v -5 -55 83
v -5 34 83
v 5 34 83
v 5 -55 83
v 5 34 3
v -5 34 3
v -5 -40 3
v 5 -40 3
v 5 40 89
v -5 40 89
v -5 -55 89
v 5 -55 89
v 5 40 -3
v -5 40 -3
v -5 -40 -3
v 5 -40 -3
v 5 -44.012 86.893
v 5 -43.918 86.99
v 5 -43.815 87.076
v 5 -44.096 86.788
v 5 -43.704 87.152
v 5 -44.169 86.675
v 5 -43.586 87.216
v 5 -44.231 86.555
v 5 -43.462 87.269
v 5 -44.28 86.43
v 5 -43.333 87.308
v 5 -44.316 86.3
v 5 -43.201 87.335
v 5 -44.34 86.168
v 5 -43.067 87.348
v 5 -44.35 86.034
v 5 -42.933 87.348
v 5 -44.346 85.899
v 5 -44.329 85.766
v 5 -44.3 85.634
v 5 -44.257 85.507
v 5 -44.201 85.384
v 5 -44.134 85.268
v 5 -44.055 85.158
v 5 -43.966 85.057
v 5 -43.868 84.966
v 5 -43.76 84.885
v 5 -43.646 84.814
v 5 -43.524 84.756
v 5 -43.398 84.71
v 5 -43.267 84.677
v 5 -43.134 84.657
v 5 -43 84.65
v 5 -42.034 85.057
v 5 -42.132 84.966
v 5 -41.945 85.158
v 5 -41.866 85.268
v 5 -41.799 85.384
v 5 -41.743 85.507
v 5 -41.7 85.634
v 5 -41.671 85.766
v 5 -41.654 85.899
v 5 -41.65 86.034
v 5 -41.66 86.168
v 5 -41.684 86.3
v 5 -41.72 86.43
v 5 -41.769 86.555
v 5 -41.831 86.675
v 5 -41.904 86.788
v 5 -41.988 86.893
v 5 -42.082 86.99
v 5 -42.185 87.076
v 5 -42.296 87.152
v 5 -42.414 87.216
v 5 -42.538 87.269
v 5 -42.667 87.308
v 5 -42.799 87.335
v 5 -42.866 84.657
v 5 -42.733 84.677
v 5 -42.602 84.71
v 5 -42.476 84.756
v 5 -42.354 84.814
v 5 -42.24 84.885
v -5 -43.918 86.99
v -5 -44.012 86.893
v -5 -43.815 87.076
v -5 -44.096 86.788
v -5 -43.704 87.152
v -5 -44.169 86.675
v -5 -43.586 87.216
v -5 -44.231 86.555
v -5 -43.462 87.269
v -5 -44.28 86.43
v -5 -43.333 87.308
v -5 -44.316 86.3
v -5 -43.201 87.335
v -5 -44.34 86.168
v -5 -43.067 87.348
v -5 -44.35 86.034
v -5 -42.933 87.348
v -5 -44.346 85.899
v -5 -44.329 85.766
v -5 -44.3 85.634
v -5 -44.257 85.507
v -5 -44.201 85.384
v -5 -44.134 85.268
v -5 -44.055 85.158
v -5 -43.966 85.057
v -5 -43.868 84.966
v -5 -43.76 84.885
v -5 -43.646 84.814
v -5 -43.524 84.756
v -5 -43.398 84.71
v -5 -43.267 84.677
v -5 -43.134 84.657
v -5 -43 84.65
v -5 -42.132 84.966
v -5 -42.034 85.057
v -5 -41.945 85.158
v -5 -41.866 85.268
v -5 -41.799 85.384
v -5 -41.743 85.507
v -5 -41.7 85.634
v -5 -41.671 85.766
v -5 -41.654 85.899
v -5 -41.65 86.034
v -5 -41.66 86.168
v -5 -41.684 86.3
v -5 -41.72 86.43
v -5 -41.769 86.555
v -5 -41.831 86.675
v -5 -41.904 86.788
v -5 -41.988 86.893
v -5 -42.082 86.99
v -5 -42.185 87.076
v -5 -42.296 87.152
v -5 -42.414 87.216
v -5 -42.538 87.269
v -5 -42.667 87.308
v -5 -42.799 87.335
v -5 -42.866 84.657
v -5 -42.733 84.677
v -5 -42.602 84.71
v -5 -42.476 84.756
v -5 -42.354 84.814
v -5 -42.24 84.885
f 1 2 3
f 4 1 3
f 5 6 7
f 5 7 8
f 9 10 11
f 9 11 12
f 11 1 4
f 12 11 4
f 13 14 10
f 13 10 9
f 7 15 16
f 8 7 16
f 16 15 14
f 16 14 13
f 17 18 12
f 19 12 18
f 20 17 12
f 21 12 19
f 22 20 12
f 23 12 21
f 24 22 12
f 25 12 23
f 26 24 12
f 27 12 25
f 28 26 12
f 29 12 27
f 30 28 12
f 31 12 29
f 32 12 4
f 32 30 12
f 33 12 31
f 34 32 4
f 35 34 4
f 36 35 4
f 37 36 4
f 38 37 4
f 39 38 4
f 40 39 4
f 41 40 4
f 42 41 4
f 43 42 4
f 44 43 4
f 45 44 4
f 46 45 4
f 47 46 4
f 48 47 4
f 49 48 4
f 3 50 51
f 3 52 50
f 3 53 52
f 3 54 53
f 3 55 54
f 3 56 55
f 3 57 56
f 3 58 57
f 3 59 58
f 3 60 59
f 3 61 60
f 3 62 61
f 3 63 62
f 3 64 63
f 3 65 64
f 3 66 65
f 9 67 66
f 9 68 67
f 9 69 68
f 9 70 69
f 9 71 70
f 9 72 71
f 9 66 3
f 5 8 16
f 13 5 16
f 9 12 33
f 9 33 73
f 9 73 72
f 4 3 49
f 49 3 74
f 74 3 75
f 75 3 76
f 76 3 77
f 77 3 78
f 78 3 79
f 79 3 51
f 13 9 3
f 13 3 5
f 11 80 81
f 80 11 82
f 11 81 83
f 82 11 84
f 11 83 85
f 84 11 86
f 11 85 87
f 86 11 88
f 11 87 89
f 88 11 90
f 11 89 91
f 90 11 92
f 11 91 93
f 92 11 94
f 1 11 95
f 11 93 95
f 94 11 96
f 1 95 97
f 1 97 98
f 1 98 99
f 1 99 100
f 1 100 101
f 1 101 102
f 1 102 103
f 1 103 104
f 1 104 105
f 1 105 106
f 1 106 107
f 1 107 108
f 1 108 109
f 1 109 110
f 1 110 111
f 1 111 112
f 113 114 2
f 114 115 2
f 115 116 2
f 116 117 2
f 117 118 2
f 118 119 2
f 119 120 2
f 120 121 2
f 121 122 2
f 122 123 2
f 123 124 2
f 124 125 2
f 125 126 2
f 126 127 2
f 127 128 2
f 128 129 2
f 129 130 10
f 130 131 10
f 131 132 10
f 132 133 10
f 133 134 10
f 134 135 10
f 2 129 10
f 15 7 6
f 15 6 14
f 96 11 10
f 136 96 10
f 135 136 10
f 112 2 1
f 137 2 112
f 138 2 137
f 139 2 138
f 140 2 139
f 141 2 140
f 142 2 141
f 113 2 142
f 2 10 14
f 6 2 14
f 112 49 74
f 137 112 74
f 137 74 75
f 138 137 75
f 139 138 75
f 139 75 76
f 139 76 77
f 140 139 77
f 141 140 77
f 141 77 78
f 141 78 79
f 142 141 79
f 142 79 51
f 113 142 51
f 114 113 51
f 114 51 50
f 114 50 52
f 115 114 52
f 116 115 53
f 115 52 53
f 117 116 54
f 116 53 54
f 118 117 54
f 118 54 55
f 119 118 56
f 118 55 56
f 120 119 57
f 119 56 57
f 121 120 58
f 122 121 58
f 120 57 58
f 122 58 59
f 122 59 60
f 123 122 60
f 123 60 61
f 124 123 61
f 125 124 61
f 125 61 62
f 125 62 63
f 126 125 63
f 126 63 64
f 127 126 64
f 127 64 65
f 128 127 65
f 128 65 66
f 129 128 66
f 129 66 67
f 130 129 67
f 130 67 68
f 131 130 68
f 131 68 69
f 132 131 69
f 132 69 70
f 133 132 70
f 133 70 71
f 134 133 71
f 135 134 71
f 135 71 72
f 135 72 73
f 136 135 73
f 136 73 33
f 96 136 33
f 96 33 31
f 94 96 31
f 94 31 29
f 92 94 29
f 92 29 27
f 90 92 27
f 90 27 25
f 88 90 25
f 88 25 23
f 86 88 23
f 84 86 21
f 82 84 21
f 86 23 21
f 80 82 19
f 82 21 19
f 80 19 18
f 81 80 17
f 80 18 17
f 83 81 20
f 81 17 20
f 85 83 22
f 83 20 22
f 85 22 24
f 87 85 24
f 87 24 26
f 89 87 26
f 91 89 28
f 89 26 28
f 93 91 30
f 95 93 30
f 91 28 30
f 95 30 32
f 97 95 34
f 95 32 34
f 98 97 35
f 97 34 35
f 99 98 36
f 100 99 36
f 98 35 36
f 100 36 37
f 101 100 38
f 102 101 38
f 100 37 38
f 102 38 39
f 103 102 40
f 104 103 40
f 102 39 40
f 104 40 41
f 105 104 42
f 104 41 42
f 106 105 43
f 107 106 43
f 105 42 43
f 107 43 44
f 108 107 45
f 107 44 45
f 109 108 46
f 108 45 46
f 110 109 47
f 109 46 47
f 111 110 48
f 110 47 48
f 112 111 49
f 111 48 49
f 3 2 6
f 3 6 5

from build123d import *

# Parameters (mm, degrees)
SKETCH1_W           = 10
SKETCH1_H           = 6
BOSS_EXTRUDE1_DEPTH = 40
SKETCH7_W           = 10
SKETCH7_H           = 80
BOSS_EXTRUDE3_DEPTH = 6
SKETCH8_W           = 10
SKETCH8_H           = 6
BOSS_EXTRUDE4_DEPTH = 95
SKETCH9_R           = 1.35
CUT_EXTRUDE3_DEPTH  = 80


with BuildPart() as part:
    # Sketch1 → Boss-Extrude1 (new, symmetric)
    with BuildSketch(Plane(origin=(0, 0, 0), x_dir=(1, 0, 0), z_dir=(0, 1, 0))):
        Rectangle(SKETCH1_W, SKETCH1_H)
    extrude(amount=BOSS_EXTRUDE1_DEPTH, both=True)

    # Sketch7 → Boss-Extrude3 (add)
    with BuildSketch(Plane(origin=(0, 40, 0), x_dir=(1, 0, 0), z_dir=(0, 1, 0))):
        with Locations((0, -43)):
            Rectangle(SKETCH7_W, SKETCH7_H)
    extrude(amount=-BOSS_EXTRUDE3_DEPTH)

    # Sketch8 → Boss-Extrude4 (add)
    with BuildSketch(Plane(origin=(0, 40, 0), x_dir=(1, 0, 0), z_dir=(0, 1, 0))):
        with Locations((0, -86)):
            Rectangle(SKETCH8_W, SKETCH8_H)
    extrude(amount=-BOSS_EXTRUDE4_DEPTH)

    # Sketch9 → Cut-Extrude3 (cut)
    with BuildSketch(Plane(origin=(5, 0, 0), x_dir=(0, 0, -1), z_dir=(1, 0, 0))):
        with Locations((-86, -43)):
            Circle(SKETCH9_R)
    extrude(amount=-CUT_EXTRUDE3_DEPTH, mode=Mode.SUBTRACT)


solid = part.part
